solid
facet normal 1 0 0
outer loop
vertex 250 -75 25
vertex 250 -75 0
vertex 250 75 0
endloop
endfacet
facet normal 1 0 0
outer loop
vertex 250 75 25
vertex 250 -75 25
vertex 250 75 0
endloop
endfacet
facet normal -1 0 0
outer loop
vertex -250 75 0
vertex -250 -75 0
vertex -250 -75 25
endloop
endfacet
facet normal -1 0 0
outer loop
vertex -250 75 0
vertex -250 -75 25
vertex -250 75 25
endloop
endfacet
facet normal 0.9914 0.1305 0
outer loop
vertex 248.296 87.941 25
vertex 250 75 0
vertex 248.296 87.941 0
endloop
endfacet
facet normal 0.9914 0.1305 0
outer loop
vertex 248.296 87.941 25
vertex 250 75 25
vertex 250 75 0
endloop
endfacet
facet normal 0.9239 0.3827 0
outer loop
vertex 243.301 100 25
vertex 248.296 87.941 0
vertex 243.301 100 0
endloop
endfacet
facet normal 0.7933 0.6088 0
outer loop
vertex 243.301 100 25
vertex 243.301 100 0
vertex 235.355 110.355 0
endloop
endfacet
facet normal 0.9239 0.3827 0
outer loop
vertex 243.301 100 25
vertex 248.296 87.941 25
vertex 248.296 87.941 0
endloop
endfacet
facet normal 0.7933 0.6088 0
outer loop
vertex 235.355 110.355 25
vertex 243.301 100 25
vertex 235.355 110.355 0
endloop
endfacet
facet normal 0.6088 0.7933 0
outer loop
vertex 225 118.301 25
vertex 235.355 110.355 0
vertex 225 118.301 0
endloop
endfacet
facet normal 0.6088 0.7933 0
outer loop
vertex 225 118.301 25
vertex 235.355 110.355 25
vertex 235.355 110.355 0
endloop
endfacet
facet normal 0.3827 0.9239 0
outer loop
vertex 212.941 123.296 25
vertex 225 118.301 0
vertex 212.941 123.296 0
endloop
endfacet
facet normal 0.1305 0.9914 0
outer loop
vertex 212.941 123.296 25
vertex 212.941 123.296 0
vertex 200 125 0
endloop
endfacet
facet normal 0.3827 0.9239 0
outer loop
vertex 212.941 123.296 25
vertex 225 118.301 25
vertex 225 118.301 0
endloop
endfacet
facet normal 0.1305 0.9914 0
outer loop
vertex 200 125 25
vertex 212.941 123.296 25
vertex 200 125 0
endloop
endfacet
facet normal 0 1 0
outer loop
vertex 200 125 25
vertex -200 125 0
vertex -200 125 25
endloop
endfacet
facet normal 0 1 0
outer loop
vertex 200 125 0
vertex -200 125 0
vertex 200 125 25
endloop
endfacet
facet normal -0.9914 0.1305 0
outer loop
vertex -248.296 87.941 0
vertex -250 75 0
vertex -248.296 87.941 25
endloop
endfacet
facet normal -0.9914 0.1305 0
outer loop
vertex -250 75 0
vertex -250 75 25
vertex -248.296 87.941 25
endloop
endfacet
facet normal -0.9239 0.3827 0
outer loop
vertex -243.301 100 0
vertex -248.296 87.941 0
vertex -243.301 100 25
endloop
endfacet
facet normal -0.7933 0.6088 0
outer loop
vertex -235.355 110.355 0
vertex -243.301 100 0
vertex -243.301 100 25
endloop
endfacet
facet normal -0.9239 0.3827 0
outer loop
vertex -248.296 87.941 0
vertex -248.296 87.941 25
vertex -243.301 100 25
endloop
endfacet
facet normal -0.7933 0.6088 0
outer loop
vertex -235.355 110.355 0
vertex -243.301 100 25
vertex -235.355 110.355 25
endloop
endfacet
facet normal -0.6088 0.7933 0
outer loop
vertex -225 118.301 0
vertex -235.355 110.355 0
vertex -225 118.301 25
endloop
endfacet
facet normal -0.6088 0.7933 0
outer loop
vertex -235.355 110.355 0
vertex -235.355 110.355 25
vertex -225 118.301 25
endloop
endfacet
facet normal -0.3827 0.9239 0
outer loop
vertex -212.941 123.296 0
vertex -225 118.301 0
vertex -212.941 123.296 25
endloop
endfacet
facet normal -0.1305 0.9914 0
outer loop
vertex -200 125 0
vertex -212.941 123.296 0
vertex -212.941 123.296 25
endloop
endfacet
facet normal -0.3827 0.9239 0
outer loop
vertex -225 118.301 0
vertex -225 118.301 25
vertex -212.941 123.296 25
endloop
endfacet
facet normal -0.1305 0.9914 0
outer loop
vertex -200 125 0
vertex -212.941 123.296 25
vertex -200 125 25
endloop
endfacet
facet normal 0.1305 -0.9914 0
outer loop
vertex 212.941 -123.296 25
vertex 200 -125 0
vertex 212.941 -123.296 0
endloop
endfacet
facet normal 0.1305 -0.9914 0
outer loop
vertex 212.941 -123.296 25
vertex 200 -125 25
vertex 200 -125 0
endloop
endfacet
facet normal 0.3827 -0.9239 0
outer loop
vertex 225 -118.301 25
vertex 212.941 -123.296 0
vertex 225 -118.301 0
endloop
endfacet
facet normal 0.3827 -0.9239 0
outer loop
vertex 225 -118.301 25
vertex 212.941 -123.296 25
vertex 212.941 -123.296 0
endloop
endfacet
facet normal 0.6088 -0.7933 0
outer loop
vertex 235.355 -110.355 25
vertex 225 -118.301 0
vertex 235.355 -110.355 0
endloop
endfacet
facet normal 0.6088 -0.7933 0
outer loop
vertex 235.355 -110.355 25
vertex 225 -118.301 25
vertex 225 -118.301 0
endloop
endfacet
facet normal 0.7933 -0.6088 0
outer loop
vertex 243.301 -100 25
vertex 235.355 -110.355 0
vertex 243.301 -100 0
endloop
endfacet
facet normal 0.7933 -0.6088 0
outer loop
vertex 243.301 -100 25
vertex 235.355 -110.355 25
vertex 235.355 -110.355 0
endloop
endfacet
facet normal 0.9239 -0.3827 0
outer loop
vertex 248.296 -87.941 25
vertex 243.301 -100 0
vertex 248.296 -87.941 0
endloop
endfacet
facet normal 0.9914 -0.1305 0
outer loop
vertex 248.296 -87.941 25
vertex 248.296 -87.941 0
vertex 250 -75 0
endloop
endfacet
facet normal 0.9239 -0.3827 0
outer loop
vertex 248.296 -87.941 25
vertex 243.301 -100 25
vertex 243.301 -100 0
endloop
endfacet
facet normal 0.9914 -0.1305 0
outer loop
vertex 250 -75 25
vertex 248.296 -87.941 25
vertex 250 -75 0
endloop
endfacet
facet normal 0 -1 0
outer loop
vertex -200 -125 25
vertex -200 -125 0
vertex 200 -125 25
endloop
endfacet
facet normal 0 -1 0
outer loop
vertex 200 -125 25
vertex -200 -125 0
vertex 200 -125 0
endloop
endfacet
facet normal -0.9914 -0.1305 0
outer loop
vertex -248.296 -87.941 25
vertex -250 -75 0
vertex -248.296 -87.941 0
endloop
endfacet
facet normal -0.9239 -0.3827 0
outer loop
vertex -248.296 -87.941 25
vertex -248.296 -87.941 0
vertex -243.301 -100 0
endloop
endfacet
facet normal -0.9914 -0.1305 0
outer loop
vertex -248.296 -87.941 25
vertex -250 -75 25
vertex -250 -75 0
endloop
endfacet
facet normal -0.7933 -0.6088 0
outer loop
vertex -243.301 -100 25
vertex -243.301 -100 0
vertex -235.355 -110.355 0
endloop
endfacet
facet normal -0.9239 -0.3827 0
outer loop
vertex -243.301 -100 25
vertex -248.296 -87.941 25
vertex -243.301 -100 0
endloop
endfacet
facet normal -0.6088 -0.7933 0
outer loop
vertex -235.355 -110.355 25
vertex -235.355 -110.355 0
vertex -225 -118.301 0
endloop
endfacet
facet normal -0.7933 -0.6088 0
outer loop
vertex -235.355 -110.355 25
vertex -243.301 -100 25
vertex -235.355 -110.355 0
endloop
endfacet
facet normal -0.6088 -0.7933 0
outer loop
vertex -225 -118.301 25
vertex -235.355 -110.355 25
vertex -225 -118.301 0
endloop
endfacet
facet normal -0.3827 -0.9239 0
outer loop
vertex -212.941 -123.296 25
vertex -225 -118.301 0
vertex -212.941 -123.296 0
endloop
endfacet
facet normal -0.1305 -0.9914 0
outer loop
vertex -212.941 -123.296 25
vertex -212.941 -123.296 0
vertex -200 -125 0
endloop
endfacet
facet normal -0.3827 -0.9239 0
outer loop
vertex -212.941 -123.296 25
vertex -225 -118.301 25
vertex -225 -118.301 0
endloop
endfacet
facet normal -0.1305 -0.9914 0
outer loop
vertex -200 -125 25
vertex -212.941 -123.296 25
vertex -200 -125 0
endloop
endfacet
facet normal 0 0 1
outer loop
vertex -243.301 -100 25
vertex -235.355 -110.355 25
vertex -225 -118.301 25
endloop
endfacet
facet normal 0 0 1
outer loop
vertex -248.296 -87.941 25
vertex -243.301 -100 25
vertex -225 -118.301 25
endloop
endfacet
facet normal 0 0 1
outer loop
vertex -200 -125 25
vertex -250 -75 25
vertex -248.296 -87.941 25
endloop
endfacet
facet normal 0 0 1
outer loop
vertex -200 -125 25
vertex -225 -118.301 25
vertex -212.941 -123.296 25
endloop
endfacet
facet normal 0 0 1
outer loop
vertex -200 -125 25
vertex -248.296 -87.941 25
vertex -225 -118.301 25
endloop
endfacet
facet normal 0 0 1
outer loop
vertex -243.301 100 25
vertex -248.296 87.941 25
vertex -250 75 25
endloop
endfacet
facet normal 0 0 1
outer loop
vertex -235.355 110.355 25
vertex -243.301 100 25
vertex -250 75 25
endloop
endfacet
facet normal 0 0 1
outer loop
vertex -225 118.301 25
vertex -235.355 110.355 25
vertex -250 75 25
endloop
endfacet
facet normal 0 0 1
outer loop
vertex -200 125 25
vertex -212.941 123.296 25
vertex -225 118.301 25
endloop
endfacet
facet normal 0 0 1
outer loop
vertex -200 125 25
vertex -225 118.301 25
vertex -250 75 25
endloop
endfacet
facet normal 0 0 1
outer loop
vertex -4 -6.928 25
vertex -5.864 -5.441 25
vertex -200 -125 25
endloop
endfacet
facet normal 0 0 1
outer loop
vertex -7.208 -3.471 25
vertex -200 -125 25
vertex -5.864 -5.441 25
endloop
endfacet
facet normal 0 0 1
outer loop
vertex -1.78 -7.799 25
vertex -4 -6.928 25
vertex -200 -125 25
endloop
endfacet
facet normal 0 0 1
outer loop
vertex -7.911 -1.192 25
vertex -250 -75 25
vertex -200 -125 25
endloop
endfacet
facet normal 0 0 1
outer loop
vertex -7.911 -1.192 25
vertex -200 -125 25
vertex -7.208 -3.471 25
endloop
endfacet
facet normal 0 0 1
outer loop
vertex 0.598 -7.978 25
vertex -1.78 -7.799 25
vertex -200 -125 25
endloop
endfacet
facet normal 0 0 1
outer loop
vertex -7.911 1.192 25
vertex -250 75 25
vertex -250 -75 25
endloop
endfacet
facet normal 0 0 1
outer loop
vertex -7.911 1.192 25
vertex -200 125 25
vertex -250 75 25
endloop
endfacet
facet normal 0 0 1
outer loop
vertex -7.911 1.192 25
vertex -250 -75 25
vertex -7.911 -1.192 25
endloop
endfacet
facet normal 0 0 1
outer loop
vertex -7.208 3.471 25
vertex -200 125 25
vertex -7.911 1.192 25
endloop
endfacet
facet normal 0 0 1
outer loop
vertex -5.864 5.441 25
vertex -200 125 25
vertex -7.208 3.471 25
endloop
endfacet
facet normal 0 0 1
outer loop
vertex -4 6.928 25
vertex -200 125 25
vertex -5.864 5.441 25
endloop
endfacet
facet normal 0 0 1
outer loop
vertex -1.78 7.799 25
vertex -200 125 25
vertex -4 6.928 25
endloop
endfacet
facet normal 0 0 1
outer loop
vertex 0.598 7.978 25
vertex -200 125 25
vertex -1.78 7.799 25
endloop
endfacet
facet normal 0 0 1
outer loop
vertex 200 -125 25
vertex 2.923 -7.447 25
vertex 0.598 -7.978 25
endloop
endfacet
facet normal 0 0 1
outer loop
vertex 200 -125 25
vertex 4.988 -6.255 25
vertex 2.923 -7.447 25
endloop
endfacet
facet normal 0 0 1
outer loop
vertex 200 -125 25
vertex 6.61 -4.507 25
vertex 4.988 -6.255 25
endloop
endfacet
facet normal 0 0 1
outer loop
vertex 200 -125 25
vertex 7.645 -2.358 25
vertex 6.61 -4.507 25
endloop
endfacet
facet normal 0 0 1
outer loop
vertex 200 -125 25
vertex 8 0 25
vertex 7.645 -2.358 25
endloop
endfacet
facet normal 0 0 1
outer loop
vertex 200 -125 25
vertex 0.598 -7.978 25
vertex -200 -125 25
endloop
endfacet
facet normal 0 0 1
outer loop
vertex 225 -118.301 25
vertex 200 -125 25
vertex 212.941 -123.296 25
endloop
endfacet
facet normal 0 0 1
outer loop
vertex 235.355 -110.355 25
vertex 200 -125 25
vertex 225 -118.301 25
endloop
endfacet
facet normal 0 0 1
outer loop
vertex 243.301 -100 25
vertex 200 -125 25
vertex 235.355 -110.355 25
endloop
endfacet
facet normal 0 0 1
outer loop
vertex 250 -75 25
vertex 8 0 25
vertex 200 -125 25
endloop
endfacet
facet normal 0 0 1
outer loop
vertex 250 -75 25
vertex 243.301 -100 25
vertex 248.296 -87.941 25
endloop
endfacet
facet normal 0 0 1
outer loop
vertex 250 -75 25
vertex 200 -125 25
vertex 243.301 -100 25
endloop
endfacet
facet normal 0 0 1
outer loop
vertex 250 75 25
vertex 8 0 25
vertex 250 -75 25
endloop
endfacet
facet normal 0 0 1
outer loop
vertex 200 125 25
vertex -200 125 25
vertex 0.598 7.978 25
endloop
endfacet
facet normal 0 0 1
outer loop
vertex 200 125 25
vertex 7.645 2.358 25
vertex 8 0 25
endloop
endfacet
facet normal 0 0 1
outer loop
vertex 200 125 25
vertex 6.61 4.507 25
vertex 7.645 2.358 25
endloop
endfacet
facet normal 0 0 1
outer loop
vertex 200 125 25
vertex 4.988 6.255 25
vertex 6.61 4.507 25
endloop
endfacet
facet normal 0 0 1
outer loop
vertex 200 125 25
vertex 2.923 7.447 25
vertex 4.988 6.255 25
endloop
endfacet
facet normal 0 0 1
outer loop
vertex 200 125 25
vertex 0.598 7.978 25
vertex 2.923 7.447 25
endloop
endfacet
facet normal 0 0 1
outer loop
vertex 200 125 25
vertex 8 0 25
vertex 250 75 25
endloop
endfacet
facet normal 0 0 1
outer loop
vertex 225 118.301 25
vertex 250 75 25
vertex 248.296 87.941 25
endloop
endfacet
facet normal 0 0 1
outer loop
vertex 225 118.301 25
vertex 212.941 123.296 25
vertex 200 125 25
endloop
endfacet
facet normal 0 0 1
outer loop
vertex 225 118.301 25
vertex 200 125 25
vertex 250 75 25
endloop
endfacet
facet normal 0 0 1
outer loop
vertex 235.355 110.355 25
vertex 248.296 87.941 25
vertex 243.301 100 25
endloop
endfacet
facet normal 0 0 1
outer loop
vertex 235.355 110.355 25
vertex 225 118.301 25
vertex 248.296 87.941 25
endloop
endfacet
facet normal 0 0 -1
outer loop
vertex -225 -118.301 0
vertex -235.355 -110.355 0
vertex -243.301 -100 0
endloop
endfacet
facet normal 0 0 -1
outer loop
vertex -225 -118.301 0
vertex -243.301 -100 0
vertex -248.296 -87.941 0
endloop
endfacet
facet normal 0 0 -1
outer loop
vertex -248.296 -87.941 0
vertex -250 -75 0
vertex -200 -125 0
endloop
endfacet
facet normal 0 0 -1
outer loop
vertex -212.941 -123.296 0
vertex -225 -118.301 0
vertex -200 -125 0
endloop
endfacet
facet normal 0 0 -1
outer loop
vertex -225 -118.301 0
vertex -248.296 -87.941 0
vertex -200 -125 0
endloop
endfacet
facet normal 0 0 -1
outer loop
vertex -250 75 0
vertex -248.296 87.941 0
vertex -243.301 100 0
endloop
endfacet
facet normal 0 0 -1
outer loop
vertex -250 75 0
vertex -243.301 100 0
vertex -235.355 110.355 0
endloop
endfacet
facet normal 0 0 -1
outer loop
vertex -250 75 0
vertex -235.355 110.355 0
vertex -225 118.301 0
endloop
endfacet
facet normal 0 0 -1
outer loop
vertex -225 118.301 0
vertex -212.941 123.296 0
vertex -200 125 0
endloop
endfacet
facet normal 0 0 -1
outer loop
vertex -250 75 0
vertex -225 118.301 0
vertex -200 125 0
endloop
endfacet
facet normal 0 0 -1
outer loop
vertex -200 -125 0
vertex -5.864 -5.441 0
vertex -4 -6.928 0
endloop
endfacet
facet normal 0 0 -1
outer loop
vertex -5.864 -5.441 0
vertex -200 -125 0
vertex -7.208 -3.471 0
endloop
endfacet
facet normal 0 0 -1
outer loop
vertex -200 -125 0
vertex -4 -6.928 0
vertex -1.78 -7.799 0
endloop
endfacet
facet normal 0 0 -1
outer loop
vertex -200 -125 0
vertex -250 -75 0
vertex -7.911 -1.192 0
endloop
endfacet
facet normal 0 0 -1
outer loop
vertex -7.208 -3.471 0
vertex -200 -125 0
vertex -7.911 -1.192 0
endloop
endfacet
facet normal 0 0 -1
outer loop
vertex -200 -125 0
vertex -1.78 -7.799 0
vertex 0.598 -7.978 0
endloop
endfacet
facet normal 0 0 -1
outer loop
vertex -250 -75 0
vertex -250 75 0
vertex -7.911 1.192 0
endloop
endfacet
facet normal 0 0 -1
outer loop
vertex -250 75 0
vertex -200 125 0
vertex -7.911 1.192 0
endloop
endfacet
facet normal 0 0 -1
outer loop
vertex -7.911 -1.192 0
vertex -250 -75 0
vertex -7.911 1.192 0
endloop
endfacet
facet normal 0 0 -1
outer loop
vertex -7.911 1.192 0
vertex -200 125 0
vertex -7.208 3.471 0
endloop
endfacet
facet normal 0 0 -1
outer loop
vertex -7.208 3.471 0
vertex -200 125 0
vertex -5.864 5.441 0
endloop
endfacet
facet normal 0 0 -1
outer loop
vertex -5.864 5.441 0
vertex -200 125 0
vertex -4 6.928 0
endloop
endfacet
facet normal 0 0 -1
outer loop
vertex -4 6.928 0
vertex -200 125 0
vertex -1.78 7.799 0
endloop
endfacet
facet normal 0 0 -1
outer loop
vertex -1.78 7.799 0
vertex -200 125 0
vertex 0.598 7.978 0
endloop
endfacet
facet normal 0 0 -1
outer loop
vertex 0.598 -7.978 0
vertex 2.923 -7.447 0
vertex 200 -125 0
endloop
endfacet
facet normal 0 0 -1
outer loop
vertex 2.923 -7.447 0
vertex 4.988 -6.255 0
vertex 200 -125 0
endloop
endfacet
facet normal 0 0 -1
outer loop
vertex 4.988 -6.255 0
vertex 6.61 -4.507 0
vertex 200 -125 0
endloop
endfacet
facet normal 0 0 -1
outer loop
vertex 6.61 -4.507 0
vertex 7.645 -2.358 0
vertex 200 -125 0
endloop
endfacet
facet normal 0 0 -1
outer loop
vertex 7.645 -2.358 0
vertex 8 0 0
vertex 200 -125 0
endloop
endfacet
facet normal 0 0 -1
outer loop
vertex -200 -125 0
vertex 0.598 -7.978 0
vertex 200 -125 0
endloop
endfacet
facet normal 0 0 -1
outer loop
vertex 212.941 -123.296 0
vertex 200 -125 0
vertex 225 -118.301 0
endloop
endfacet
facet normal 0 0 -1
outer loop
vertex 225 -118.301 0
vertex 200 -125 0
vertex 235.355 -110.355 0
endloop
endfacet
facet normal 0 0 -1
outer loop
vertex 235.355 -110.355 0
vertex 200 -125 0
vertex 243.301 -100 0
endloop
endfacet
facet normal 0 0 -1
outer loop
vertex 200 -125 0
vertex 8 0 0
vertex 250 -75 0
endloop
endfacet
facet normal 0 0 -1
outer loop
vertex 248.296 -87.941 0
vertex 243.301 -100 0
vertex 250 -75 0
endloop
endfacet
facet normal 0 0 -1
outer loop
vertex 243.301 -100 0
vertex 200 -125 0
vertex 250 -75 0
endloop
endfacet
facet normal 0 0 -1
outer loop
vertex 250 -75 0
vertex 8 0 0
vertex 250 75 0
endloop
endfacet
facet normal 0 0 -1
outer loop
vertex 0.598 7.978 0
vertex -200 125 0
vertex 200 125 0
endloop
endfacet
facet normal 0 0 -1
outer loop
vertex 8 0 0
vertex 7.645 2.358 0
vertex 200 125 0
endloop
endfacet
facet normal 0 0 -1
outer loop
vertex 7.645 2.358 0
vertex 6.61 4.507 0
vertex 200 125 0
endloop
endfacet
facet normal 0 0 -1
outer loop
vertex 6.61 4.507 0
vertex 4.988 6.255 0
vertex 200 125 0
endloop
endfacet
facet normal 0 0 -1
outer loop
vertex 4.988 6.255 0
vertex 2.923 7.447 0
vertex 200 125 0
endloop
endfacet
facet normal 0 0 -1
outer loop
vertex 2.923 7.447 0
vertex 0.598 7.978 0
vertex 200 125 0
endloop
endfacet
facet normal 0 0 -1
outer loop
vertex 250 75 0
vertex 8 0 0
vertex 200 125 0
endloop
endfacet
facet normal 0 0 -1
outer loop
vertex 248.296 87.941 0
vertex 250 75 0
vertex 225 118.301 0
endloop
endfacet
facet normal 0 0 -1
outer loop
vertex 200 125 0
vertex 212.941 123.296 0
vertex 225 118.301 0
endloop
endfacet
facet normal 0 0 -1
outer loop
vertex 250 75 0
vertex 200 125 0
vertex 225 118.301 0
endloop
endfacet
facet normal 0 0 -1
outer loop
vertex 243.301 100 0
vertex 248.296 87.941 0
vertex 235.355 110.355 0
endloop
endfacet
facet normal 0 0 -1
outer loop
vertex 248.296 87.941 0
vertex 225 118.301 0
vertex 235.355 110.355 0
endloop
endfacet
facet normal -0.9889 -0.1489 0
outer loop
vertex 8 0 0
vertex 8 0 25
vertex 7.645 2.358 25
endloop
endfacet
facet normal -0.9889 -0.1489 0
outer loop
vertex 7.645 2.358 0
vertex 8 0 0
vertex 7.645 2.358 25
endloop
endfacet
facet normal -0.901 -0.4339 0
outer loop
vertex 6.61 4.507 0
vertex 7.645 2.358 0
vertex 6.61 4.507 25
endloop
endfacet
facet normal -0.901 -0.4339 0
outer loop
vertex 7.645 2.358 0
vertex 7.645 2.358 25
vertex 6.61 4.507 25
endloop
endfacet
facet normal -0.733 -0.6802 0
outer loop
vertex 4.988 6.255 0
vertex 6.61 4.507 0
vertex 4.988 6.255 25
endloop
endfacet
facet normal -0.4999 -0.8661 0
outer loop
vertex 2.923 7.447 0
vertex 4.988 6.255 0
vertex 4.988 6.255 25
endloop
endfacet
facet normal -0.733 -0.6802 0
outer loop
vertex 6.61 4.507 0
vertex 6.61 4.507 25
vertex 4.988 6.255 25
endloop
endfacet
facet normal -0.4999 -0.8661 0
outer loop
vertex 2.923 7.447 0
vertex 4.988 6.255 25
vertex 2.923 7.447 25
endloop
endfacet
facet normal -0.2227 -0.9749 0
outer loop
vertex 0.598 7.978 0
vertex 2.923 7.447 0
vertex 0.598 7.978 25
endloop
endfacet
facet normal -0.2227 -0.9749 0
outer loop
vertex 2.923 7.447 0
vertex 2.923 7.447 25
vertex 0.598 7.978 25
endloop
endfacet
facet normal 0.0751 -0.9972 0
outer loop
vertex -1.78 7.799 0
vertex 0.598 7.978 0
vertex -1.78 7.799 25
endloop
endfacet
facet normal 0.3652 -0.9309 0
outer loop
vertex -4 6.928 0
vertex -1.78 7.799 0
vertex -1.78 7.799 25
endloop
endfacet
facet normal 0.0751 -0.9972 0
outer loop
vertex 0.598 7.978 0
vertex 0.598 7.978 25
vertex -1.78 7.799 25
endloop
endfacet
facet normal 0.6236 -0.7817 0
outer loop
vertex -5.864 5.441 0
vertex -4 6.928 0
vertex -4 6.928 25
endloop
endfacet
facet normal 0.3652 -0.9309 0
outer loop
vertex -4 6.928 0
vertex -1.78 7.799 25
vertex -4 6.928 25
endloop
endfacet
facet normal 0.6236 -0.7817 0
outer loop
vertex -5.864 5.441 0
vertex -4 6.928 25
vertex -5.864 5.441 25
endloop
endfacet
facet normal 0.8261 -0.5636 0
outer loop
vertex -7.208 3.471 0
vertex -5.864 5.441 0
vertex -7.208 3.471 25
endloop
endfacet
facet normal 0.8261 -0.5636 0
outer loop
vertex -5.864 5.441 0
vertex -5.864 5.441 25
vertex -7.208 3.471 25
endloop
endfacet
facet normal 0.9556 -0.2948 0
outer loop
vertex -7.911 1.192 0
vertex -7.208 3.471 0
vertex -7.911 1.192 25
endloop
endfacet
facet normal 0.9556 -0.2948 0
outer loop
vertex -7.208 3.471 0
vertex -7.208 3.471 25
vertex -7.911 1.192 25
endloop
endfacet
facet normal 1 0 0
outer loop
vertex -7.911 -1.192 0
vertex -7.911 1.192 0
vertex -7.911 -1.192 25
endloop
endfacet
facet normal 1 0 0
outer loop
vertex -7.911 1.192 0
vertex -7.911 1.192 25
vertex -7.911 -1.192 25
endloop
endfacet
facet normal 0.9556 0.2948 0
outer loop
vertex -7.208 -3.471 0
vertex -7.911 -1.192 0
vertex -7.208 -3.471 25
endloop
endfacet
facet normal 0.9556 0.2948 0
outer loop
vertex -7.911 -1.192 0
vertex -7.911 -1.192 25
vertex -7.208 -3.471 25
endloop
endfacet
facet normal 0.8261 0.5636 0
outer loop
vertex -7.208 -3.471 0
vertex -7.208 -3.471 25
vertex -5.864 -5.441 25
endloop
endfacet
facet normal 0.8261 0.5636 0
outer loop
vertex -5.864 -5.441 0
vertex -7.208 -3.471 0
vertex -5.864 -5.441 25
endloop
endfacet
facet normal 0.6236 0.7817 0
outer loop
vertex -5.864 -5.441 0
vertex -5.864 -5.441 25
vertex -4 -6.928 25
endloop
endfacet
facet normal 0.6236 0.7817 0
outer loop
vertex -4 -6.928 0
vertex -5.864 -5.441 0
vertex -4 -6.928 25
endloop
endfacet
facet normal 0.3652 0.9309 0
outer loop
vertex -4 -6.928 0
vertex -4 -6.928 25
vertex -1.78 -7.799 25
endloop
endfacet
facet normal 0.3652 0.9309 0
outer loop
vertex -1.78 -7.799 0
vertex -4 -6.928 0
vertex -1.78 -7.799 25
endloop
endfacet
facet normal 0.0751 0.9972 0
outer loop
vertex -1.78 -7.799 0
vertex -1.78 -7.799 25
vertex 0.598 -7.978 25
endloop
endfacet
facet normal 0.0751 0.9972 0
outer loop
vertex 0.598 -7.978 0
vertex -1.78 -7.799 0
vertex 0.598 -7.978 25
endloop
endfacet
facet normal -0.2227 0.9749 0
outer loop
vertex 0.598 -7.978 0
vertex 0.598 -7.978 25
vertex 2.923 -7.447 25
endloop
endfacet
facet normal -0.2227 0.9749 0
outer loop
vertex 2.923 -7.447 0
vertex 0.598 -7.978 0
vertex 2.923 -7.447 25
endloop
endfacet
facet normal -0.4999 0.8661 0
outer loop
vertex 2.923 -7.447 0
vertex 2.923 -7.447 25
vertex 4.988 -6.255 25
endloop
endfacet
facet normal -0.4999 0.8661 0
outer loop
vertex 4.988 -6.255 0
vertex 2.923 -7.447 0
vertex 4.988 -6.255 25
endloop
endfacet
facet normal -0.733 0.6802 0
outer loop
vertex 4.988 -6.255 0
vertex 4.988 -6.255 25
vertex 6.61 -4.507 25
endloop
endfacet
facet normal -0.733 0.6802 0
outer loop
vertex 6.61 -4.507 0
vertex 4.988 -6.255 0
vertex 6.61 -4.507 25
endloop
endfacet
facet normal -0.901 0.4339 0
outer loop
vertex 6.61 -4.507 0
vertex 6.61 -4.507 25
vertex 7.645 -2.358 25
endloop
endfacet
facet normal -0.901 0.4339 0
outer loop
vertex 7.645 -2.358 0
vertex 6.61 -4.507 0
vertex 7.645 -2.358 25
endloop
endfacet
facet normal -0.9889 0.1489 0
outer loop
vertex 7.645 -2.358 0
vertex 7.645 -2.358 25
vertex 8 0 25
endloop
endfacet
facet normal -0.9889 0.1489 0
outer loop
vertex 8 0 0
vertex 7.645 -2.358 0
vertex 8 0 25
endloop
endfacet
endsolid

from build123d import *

# Parameters (mm, degrees)
F0_W     = 500
F0_H     = 250
F1_DEPTH = 25
F2_R     = 50
F3_R     = 8
F4_DEPTH = 25.001


with BuildPart() as f1:
    # F0 (on Top) → F1 (new body)
    with BuildSketch(Plane.XY):
        Rectangle(F0_W, F0_H)
    extrude(amount=F1_DEPTH)

    # F2
    f2_edges = [f1.edges().sort_by_distance(p)[0] for p in [
        (-250, -125, 12.5),
        (250, -125, 12.5),
        (250, 125, 12.5),
        (-250, 125, 12.5),
    ]]
    fillet(f2_edges, radius=F2_R)

    # F3 (on face) → F4 (cut, through all)
    with BuildSketch(Plane.XY.offset(25)):
        Circle(F3_R)
    extrude(amount=-F4_DEPTH, mode=Mode.SUBTRACT)


solid = f1.part
